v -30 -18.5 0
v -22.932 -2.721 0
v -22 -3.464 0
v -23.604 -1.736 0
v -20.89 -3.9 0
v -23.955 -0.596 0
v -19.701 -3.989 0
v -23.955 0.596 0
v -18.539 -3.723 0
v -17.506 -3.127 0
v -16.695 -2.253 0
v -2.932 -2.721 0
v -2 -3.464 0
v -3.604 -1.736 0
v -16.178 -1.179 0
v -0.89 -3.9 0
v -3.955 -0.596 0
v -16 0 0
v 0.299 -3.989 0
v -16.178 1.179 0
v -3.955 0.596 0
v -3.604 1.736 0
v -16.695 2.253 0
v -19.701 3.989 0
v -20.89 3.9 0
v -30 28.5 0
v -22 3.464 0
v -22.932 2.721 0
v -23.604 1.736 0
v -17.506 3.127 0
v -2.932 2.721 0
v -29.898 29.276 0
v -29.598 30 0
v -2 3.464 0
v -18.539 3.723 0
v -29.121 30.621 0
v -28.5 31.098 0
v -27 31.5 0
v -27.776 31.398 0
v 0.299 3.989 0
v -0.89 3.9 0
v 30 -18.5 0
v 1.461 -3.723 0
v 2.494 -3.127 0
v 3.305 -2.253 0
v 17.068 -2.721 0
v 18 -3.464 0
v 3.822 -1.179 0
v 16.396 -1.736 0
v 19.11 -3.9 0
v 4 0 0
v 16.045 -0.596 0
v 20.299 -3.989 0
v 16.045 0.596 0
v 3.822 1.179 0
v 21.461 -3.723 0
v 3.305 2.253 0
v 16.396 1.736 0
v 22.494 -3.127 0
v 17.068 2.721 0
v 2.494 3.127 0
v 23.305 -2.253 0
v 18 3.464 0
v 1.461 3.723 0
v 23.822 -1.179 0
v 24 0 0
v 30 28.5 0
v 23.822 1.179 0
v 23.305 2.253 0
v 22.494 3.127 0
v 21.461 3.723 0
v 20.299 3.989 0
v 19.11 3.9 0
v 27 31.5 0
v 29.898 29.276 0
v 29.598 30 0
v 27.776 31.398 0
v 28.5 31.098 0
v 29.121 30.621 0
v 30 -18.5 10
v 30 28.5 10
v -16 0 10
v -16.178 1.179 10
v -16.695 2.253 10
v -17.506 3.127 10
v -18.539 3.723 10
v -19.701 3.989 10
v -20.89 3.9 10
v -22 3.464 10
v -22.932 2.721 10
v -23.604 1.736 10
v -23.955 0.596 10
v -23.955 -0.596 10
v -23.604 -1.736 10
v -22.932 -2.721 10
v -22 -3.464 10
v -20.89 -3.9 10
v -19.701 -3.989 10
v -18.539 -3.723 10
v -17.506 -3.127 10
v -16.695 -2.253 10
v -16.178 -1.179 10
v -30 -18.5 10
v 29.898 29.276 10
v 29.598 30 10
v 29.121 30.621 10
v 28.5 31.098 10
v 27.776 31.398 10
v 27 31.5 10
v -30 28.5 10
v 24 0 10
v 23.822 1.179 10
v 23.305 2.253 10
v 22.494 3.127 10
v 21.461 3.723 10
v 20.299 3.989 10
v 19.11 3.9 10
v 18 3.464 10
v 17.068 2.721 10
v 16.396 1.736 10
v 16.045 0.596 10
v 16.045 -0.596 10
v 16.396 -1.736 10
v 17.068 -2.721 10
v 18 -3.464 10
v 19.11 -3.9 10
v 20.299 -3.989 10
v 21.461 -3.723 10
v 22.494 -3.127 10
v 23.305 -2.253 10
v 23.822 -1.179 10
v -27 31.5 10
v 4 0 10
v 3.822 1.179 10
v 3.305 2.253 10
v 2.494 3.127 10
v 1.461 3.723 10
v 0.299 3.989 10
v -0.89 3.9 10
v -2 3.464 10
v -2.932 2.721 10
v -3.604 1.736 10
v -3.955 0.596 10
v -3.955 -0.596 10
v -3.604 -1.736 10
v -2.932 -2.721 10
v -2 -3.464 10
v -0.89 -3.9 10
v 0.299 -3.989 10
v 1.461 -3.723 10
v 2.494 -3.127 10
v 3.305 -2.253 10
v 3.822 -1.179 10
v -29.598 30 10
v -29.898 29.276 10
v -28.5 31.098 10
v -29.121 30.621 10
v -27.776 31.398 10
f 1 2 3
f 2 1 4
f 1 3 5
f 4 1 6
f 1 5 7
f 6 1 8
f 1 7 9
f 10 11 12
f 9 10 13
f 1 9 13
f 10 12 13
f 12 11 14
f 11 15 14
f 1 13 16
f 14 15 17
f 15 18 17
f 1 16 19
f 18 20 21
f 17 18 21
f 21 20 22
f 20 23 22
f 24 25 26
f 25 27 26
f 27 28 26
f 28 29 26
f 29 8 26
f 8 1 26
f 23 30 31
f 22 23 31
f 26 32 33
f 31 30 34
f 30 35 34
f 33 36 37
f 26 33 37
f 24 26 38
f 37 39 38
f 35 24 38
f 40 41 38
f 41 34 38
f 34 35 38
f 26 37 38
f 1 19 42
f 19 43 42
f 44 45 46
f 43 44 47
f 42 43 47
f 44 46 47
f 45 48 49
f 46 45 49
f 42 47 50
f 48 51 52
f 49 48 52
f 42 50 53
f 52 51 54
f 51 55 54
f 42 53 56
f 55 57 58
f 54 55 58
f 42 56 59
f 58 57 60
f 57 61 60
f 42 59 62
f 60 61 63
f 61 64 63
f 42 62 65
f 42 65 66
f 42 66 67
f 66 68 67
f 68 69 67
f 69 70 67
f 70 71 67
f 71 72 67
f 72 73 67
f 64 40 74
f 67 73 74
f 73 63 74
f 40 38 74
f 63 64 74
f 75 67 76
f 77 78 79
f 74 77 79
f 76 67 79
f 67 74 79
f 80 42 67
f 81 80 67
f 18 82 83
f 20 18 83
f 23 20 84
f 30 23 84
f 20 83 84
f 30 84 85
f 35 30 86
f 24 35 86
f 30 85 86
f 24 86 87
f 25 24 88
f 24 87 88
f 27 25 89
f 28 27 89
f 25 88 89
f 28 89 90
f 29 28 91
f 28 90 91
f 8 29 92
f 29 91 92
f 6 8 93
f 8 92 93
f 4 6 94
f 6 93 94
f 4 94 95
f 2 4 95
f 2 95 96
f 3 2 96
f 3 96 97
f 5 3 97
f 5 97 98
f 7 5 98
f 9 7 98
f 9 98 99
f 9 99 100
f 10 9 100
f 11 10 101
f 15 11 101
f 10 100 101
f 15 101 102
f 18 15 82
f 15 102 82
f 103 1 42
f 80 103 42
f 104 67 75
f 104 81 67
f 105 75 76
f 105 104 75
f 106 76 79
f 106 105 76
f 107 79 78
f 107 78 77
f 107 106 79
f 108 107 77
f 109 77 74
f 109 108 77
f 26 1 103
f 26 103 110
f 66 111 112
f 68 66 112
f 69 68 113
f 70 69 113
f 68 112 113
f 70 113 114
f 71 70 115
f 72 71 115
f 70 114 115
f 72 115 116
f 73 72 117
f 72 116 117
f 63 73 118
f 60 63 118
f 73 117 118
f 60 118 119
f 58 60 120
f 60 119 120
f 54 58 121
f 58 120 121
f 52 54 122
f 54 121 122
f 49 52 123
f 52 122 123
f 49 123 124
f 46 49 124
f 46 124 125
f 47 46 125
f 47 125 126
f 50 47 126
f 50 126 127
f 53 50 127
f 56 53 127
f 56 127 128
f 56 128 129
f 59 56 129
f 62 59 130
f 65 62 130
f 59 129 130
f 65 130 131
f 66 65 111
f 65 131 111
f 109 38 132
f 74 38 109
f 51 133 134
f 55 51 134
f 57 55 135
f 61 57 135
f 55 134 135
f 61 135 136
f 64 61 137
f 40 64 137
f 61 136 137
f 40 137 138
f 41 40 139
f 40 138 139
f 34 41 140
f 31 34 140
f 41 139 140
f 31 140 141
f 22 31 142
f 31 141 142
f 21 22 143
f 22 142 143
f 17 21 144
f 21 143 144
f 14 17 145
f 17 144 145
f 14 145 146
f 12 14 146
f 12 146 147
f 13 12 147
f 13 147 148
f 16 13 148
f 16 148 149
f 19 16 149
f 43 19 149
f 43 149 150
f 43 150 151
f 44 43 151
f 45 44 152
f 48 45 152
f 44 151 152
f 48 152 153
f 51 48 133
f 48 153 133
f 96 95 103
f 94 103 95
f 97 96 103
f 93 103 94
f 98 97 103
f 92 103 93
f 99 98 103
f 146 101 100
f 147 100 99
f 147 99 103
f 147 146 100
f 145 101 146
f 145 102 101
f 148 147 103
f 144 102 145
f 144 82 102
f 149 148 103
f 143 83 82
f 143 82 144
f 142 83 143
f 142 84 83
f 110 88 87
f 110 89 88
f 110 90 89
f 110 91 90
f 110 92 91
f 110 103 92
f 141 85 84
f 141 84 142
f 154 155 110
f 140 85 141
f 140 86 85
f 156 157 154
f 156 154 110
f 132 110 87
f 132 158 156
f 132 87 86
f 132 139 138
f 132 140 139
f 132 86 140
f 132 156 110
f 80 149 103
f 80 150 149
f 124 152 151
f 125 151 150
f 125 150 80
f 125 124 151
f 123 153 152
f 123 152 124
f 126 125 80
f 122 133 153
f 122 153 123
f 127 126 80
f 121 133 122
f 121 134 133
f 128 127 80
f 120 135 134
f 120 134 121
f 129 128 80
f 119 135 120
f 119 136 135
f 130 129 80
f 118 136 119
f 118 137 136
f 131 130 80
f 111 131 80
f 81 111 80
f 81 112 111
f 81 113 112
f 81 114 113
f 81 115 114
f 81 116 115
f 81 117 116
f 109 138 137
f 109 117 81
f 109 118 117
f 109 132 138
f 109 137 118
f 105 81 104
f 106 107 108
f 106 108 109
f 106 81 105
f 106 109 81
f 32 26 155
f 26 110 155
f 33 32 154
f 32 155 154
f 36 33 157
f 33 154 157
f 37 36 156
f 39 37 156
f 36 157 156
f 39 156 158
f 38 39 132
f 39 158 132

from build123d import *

# Parameters (mm, degrees)
ESQUISSE1_W             = 60
ESQUISSE1_H             = 50
BASE_EXTRUSION_DEPTH    = 10
CONG_1_R                = 3
ESQUISSE2_R             = 4
ENL_V_MAT_EXTRU_1_DEPTH = 10


with BuildPart() as part:
    # Esquisse1 → Base-Extrusion (new body)
    with BuildSketch(Plane.XY):
        with Locations((0, 6.5)):
            Rectangle(ESQUISSE1_W, ESQUISSE1_H)
    extrude(amount=BASE_EXTRUSION_DEPTH)

    # Congé1
    cong_1_edges = [part.edges().sort_by_distance(p)[0] for p in [
        (30, 31.5, 5),
        (-30, 31.5, 5),
    ]]
    fillet(cong_1_edges, radius=CONG_1_R)

    # Esquisse2 → Enlèv. mat.-Extru.1 (cut)
    with BuildSketch(Plane.XY.offset(10)):
        with Locations((-20, 0)):
            Circle(ESQUISSE2_R)
        Circle(ESQUISSE2_R)
        with Locations((20, 0)):
            Circle(ESQUISSE2_R)
    extrude(amount=-ENL_V_MAT_EXTRU_1_DEPTH, mode=Mode.SUBTRACT)


solid = part.part
